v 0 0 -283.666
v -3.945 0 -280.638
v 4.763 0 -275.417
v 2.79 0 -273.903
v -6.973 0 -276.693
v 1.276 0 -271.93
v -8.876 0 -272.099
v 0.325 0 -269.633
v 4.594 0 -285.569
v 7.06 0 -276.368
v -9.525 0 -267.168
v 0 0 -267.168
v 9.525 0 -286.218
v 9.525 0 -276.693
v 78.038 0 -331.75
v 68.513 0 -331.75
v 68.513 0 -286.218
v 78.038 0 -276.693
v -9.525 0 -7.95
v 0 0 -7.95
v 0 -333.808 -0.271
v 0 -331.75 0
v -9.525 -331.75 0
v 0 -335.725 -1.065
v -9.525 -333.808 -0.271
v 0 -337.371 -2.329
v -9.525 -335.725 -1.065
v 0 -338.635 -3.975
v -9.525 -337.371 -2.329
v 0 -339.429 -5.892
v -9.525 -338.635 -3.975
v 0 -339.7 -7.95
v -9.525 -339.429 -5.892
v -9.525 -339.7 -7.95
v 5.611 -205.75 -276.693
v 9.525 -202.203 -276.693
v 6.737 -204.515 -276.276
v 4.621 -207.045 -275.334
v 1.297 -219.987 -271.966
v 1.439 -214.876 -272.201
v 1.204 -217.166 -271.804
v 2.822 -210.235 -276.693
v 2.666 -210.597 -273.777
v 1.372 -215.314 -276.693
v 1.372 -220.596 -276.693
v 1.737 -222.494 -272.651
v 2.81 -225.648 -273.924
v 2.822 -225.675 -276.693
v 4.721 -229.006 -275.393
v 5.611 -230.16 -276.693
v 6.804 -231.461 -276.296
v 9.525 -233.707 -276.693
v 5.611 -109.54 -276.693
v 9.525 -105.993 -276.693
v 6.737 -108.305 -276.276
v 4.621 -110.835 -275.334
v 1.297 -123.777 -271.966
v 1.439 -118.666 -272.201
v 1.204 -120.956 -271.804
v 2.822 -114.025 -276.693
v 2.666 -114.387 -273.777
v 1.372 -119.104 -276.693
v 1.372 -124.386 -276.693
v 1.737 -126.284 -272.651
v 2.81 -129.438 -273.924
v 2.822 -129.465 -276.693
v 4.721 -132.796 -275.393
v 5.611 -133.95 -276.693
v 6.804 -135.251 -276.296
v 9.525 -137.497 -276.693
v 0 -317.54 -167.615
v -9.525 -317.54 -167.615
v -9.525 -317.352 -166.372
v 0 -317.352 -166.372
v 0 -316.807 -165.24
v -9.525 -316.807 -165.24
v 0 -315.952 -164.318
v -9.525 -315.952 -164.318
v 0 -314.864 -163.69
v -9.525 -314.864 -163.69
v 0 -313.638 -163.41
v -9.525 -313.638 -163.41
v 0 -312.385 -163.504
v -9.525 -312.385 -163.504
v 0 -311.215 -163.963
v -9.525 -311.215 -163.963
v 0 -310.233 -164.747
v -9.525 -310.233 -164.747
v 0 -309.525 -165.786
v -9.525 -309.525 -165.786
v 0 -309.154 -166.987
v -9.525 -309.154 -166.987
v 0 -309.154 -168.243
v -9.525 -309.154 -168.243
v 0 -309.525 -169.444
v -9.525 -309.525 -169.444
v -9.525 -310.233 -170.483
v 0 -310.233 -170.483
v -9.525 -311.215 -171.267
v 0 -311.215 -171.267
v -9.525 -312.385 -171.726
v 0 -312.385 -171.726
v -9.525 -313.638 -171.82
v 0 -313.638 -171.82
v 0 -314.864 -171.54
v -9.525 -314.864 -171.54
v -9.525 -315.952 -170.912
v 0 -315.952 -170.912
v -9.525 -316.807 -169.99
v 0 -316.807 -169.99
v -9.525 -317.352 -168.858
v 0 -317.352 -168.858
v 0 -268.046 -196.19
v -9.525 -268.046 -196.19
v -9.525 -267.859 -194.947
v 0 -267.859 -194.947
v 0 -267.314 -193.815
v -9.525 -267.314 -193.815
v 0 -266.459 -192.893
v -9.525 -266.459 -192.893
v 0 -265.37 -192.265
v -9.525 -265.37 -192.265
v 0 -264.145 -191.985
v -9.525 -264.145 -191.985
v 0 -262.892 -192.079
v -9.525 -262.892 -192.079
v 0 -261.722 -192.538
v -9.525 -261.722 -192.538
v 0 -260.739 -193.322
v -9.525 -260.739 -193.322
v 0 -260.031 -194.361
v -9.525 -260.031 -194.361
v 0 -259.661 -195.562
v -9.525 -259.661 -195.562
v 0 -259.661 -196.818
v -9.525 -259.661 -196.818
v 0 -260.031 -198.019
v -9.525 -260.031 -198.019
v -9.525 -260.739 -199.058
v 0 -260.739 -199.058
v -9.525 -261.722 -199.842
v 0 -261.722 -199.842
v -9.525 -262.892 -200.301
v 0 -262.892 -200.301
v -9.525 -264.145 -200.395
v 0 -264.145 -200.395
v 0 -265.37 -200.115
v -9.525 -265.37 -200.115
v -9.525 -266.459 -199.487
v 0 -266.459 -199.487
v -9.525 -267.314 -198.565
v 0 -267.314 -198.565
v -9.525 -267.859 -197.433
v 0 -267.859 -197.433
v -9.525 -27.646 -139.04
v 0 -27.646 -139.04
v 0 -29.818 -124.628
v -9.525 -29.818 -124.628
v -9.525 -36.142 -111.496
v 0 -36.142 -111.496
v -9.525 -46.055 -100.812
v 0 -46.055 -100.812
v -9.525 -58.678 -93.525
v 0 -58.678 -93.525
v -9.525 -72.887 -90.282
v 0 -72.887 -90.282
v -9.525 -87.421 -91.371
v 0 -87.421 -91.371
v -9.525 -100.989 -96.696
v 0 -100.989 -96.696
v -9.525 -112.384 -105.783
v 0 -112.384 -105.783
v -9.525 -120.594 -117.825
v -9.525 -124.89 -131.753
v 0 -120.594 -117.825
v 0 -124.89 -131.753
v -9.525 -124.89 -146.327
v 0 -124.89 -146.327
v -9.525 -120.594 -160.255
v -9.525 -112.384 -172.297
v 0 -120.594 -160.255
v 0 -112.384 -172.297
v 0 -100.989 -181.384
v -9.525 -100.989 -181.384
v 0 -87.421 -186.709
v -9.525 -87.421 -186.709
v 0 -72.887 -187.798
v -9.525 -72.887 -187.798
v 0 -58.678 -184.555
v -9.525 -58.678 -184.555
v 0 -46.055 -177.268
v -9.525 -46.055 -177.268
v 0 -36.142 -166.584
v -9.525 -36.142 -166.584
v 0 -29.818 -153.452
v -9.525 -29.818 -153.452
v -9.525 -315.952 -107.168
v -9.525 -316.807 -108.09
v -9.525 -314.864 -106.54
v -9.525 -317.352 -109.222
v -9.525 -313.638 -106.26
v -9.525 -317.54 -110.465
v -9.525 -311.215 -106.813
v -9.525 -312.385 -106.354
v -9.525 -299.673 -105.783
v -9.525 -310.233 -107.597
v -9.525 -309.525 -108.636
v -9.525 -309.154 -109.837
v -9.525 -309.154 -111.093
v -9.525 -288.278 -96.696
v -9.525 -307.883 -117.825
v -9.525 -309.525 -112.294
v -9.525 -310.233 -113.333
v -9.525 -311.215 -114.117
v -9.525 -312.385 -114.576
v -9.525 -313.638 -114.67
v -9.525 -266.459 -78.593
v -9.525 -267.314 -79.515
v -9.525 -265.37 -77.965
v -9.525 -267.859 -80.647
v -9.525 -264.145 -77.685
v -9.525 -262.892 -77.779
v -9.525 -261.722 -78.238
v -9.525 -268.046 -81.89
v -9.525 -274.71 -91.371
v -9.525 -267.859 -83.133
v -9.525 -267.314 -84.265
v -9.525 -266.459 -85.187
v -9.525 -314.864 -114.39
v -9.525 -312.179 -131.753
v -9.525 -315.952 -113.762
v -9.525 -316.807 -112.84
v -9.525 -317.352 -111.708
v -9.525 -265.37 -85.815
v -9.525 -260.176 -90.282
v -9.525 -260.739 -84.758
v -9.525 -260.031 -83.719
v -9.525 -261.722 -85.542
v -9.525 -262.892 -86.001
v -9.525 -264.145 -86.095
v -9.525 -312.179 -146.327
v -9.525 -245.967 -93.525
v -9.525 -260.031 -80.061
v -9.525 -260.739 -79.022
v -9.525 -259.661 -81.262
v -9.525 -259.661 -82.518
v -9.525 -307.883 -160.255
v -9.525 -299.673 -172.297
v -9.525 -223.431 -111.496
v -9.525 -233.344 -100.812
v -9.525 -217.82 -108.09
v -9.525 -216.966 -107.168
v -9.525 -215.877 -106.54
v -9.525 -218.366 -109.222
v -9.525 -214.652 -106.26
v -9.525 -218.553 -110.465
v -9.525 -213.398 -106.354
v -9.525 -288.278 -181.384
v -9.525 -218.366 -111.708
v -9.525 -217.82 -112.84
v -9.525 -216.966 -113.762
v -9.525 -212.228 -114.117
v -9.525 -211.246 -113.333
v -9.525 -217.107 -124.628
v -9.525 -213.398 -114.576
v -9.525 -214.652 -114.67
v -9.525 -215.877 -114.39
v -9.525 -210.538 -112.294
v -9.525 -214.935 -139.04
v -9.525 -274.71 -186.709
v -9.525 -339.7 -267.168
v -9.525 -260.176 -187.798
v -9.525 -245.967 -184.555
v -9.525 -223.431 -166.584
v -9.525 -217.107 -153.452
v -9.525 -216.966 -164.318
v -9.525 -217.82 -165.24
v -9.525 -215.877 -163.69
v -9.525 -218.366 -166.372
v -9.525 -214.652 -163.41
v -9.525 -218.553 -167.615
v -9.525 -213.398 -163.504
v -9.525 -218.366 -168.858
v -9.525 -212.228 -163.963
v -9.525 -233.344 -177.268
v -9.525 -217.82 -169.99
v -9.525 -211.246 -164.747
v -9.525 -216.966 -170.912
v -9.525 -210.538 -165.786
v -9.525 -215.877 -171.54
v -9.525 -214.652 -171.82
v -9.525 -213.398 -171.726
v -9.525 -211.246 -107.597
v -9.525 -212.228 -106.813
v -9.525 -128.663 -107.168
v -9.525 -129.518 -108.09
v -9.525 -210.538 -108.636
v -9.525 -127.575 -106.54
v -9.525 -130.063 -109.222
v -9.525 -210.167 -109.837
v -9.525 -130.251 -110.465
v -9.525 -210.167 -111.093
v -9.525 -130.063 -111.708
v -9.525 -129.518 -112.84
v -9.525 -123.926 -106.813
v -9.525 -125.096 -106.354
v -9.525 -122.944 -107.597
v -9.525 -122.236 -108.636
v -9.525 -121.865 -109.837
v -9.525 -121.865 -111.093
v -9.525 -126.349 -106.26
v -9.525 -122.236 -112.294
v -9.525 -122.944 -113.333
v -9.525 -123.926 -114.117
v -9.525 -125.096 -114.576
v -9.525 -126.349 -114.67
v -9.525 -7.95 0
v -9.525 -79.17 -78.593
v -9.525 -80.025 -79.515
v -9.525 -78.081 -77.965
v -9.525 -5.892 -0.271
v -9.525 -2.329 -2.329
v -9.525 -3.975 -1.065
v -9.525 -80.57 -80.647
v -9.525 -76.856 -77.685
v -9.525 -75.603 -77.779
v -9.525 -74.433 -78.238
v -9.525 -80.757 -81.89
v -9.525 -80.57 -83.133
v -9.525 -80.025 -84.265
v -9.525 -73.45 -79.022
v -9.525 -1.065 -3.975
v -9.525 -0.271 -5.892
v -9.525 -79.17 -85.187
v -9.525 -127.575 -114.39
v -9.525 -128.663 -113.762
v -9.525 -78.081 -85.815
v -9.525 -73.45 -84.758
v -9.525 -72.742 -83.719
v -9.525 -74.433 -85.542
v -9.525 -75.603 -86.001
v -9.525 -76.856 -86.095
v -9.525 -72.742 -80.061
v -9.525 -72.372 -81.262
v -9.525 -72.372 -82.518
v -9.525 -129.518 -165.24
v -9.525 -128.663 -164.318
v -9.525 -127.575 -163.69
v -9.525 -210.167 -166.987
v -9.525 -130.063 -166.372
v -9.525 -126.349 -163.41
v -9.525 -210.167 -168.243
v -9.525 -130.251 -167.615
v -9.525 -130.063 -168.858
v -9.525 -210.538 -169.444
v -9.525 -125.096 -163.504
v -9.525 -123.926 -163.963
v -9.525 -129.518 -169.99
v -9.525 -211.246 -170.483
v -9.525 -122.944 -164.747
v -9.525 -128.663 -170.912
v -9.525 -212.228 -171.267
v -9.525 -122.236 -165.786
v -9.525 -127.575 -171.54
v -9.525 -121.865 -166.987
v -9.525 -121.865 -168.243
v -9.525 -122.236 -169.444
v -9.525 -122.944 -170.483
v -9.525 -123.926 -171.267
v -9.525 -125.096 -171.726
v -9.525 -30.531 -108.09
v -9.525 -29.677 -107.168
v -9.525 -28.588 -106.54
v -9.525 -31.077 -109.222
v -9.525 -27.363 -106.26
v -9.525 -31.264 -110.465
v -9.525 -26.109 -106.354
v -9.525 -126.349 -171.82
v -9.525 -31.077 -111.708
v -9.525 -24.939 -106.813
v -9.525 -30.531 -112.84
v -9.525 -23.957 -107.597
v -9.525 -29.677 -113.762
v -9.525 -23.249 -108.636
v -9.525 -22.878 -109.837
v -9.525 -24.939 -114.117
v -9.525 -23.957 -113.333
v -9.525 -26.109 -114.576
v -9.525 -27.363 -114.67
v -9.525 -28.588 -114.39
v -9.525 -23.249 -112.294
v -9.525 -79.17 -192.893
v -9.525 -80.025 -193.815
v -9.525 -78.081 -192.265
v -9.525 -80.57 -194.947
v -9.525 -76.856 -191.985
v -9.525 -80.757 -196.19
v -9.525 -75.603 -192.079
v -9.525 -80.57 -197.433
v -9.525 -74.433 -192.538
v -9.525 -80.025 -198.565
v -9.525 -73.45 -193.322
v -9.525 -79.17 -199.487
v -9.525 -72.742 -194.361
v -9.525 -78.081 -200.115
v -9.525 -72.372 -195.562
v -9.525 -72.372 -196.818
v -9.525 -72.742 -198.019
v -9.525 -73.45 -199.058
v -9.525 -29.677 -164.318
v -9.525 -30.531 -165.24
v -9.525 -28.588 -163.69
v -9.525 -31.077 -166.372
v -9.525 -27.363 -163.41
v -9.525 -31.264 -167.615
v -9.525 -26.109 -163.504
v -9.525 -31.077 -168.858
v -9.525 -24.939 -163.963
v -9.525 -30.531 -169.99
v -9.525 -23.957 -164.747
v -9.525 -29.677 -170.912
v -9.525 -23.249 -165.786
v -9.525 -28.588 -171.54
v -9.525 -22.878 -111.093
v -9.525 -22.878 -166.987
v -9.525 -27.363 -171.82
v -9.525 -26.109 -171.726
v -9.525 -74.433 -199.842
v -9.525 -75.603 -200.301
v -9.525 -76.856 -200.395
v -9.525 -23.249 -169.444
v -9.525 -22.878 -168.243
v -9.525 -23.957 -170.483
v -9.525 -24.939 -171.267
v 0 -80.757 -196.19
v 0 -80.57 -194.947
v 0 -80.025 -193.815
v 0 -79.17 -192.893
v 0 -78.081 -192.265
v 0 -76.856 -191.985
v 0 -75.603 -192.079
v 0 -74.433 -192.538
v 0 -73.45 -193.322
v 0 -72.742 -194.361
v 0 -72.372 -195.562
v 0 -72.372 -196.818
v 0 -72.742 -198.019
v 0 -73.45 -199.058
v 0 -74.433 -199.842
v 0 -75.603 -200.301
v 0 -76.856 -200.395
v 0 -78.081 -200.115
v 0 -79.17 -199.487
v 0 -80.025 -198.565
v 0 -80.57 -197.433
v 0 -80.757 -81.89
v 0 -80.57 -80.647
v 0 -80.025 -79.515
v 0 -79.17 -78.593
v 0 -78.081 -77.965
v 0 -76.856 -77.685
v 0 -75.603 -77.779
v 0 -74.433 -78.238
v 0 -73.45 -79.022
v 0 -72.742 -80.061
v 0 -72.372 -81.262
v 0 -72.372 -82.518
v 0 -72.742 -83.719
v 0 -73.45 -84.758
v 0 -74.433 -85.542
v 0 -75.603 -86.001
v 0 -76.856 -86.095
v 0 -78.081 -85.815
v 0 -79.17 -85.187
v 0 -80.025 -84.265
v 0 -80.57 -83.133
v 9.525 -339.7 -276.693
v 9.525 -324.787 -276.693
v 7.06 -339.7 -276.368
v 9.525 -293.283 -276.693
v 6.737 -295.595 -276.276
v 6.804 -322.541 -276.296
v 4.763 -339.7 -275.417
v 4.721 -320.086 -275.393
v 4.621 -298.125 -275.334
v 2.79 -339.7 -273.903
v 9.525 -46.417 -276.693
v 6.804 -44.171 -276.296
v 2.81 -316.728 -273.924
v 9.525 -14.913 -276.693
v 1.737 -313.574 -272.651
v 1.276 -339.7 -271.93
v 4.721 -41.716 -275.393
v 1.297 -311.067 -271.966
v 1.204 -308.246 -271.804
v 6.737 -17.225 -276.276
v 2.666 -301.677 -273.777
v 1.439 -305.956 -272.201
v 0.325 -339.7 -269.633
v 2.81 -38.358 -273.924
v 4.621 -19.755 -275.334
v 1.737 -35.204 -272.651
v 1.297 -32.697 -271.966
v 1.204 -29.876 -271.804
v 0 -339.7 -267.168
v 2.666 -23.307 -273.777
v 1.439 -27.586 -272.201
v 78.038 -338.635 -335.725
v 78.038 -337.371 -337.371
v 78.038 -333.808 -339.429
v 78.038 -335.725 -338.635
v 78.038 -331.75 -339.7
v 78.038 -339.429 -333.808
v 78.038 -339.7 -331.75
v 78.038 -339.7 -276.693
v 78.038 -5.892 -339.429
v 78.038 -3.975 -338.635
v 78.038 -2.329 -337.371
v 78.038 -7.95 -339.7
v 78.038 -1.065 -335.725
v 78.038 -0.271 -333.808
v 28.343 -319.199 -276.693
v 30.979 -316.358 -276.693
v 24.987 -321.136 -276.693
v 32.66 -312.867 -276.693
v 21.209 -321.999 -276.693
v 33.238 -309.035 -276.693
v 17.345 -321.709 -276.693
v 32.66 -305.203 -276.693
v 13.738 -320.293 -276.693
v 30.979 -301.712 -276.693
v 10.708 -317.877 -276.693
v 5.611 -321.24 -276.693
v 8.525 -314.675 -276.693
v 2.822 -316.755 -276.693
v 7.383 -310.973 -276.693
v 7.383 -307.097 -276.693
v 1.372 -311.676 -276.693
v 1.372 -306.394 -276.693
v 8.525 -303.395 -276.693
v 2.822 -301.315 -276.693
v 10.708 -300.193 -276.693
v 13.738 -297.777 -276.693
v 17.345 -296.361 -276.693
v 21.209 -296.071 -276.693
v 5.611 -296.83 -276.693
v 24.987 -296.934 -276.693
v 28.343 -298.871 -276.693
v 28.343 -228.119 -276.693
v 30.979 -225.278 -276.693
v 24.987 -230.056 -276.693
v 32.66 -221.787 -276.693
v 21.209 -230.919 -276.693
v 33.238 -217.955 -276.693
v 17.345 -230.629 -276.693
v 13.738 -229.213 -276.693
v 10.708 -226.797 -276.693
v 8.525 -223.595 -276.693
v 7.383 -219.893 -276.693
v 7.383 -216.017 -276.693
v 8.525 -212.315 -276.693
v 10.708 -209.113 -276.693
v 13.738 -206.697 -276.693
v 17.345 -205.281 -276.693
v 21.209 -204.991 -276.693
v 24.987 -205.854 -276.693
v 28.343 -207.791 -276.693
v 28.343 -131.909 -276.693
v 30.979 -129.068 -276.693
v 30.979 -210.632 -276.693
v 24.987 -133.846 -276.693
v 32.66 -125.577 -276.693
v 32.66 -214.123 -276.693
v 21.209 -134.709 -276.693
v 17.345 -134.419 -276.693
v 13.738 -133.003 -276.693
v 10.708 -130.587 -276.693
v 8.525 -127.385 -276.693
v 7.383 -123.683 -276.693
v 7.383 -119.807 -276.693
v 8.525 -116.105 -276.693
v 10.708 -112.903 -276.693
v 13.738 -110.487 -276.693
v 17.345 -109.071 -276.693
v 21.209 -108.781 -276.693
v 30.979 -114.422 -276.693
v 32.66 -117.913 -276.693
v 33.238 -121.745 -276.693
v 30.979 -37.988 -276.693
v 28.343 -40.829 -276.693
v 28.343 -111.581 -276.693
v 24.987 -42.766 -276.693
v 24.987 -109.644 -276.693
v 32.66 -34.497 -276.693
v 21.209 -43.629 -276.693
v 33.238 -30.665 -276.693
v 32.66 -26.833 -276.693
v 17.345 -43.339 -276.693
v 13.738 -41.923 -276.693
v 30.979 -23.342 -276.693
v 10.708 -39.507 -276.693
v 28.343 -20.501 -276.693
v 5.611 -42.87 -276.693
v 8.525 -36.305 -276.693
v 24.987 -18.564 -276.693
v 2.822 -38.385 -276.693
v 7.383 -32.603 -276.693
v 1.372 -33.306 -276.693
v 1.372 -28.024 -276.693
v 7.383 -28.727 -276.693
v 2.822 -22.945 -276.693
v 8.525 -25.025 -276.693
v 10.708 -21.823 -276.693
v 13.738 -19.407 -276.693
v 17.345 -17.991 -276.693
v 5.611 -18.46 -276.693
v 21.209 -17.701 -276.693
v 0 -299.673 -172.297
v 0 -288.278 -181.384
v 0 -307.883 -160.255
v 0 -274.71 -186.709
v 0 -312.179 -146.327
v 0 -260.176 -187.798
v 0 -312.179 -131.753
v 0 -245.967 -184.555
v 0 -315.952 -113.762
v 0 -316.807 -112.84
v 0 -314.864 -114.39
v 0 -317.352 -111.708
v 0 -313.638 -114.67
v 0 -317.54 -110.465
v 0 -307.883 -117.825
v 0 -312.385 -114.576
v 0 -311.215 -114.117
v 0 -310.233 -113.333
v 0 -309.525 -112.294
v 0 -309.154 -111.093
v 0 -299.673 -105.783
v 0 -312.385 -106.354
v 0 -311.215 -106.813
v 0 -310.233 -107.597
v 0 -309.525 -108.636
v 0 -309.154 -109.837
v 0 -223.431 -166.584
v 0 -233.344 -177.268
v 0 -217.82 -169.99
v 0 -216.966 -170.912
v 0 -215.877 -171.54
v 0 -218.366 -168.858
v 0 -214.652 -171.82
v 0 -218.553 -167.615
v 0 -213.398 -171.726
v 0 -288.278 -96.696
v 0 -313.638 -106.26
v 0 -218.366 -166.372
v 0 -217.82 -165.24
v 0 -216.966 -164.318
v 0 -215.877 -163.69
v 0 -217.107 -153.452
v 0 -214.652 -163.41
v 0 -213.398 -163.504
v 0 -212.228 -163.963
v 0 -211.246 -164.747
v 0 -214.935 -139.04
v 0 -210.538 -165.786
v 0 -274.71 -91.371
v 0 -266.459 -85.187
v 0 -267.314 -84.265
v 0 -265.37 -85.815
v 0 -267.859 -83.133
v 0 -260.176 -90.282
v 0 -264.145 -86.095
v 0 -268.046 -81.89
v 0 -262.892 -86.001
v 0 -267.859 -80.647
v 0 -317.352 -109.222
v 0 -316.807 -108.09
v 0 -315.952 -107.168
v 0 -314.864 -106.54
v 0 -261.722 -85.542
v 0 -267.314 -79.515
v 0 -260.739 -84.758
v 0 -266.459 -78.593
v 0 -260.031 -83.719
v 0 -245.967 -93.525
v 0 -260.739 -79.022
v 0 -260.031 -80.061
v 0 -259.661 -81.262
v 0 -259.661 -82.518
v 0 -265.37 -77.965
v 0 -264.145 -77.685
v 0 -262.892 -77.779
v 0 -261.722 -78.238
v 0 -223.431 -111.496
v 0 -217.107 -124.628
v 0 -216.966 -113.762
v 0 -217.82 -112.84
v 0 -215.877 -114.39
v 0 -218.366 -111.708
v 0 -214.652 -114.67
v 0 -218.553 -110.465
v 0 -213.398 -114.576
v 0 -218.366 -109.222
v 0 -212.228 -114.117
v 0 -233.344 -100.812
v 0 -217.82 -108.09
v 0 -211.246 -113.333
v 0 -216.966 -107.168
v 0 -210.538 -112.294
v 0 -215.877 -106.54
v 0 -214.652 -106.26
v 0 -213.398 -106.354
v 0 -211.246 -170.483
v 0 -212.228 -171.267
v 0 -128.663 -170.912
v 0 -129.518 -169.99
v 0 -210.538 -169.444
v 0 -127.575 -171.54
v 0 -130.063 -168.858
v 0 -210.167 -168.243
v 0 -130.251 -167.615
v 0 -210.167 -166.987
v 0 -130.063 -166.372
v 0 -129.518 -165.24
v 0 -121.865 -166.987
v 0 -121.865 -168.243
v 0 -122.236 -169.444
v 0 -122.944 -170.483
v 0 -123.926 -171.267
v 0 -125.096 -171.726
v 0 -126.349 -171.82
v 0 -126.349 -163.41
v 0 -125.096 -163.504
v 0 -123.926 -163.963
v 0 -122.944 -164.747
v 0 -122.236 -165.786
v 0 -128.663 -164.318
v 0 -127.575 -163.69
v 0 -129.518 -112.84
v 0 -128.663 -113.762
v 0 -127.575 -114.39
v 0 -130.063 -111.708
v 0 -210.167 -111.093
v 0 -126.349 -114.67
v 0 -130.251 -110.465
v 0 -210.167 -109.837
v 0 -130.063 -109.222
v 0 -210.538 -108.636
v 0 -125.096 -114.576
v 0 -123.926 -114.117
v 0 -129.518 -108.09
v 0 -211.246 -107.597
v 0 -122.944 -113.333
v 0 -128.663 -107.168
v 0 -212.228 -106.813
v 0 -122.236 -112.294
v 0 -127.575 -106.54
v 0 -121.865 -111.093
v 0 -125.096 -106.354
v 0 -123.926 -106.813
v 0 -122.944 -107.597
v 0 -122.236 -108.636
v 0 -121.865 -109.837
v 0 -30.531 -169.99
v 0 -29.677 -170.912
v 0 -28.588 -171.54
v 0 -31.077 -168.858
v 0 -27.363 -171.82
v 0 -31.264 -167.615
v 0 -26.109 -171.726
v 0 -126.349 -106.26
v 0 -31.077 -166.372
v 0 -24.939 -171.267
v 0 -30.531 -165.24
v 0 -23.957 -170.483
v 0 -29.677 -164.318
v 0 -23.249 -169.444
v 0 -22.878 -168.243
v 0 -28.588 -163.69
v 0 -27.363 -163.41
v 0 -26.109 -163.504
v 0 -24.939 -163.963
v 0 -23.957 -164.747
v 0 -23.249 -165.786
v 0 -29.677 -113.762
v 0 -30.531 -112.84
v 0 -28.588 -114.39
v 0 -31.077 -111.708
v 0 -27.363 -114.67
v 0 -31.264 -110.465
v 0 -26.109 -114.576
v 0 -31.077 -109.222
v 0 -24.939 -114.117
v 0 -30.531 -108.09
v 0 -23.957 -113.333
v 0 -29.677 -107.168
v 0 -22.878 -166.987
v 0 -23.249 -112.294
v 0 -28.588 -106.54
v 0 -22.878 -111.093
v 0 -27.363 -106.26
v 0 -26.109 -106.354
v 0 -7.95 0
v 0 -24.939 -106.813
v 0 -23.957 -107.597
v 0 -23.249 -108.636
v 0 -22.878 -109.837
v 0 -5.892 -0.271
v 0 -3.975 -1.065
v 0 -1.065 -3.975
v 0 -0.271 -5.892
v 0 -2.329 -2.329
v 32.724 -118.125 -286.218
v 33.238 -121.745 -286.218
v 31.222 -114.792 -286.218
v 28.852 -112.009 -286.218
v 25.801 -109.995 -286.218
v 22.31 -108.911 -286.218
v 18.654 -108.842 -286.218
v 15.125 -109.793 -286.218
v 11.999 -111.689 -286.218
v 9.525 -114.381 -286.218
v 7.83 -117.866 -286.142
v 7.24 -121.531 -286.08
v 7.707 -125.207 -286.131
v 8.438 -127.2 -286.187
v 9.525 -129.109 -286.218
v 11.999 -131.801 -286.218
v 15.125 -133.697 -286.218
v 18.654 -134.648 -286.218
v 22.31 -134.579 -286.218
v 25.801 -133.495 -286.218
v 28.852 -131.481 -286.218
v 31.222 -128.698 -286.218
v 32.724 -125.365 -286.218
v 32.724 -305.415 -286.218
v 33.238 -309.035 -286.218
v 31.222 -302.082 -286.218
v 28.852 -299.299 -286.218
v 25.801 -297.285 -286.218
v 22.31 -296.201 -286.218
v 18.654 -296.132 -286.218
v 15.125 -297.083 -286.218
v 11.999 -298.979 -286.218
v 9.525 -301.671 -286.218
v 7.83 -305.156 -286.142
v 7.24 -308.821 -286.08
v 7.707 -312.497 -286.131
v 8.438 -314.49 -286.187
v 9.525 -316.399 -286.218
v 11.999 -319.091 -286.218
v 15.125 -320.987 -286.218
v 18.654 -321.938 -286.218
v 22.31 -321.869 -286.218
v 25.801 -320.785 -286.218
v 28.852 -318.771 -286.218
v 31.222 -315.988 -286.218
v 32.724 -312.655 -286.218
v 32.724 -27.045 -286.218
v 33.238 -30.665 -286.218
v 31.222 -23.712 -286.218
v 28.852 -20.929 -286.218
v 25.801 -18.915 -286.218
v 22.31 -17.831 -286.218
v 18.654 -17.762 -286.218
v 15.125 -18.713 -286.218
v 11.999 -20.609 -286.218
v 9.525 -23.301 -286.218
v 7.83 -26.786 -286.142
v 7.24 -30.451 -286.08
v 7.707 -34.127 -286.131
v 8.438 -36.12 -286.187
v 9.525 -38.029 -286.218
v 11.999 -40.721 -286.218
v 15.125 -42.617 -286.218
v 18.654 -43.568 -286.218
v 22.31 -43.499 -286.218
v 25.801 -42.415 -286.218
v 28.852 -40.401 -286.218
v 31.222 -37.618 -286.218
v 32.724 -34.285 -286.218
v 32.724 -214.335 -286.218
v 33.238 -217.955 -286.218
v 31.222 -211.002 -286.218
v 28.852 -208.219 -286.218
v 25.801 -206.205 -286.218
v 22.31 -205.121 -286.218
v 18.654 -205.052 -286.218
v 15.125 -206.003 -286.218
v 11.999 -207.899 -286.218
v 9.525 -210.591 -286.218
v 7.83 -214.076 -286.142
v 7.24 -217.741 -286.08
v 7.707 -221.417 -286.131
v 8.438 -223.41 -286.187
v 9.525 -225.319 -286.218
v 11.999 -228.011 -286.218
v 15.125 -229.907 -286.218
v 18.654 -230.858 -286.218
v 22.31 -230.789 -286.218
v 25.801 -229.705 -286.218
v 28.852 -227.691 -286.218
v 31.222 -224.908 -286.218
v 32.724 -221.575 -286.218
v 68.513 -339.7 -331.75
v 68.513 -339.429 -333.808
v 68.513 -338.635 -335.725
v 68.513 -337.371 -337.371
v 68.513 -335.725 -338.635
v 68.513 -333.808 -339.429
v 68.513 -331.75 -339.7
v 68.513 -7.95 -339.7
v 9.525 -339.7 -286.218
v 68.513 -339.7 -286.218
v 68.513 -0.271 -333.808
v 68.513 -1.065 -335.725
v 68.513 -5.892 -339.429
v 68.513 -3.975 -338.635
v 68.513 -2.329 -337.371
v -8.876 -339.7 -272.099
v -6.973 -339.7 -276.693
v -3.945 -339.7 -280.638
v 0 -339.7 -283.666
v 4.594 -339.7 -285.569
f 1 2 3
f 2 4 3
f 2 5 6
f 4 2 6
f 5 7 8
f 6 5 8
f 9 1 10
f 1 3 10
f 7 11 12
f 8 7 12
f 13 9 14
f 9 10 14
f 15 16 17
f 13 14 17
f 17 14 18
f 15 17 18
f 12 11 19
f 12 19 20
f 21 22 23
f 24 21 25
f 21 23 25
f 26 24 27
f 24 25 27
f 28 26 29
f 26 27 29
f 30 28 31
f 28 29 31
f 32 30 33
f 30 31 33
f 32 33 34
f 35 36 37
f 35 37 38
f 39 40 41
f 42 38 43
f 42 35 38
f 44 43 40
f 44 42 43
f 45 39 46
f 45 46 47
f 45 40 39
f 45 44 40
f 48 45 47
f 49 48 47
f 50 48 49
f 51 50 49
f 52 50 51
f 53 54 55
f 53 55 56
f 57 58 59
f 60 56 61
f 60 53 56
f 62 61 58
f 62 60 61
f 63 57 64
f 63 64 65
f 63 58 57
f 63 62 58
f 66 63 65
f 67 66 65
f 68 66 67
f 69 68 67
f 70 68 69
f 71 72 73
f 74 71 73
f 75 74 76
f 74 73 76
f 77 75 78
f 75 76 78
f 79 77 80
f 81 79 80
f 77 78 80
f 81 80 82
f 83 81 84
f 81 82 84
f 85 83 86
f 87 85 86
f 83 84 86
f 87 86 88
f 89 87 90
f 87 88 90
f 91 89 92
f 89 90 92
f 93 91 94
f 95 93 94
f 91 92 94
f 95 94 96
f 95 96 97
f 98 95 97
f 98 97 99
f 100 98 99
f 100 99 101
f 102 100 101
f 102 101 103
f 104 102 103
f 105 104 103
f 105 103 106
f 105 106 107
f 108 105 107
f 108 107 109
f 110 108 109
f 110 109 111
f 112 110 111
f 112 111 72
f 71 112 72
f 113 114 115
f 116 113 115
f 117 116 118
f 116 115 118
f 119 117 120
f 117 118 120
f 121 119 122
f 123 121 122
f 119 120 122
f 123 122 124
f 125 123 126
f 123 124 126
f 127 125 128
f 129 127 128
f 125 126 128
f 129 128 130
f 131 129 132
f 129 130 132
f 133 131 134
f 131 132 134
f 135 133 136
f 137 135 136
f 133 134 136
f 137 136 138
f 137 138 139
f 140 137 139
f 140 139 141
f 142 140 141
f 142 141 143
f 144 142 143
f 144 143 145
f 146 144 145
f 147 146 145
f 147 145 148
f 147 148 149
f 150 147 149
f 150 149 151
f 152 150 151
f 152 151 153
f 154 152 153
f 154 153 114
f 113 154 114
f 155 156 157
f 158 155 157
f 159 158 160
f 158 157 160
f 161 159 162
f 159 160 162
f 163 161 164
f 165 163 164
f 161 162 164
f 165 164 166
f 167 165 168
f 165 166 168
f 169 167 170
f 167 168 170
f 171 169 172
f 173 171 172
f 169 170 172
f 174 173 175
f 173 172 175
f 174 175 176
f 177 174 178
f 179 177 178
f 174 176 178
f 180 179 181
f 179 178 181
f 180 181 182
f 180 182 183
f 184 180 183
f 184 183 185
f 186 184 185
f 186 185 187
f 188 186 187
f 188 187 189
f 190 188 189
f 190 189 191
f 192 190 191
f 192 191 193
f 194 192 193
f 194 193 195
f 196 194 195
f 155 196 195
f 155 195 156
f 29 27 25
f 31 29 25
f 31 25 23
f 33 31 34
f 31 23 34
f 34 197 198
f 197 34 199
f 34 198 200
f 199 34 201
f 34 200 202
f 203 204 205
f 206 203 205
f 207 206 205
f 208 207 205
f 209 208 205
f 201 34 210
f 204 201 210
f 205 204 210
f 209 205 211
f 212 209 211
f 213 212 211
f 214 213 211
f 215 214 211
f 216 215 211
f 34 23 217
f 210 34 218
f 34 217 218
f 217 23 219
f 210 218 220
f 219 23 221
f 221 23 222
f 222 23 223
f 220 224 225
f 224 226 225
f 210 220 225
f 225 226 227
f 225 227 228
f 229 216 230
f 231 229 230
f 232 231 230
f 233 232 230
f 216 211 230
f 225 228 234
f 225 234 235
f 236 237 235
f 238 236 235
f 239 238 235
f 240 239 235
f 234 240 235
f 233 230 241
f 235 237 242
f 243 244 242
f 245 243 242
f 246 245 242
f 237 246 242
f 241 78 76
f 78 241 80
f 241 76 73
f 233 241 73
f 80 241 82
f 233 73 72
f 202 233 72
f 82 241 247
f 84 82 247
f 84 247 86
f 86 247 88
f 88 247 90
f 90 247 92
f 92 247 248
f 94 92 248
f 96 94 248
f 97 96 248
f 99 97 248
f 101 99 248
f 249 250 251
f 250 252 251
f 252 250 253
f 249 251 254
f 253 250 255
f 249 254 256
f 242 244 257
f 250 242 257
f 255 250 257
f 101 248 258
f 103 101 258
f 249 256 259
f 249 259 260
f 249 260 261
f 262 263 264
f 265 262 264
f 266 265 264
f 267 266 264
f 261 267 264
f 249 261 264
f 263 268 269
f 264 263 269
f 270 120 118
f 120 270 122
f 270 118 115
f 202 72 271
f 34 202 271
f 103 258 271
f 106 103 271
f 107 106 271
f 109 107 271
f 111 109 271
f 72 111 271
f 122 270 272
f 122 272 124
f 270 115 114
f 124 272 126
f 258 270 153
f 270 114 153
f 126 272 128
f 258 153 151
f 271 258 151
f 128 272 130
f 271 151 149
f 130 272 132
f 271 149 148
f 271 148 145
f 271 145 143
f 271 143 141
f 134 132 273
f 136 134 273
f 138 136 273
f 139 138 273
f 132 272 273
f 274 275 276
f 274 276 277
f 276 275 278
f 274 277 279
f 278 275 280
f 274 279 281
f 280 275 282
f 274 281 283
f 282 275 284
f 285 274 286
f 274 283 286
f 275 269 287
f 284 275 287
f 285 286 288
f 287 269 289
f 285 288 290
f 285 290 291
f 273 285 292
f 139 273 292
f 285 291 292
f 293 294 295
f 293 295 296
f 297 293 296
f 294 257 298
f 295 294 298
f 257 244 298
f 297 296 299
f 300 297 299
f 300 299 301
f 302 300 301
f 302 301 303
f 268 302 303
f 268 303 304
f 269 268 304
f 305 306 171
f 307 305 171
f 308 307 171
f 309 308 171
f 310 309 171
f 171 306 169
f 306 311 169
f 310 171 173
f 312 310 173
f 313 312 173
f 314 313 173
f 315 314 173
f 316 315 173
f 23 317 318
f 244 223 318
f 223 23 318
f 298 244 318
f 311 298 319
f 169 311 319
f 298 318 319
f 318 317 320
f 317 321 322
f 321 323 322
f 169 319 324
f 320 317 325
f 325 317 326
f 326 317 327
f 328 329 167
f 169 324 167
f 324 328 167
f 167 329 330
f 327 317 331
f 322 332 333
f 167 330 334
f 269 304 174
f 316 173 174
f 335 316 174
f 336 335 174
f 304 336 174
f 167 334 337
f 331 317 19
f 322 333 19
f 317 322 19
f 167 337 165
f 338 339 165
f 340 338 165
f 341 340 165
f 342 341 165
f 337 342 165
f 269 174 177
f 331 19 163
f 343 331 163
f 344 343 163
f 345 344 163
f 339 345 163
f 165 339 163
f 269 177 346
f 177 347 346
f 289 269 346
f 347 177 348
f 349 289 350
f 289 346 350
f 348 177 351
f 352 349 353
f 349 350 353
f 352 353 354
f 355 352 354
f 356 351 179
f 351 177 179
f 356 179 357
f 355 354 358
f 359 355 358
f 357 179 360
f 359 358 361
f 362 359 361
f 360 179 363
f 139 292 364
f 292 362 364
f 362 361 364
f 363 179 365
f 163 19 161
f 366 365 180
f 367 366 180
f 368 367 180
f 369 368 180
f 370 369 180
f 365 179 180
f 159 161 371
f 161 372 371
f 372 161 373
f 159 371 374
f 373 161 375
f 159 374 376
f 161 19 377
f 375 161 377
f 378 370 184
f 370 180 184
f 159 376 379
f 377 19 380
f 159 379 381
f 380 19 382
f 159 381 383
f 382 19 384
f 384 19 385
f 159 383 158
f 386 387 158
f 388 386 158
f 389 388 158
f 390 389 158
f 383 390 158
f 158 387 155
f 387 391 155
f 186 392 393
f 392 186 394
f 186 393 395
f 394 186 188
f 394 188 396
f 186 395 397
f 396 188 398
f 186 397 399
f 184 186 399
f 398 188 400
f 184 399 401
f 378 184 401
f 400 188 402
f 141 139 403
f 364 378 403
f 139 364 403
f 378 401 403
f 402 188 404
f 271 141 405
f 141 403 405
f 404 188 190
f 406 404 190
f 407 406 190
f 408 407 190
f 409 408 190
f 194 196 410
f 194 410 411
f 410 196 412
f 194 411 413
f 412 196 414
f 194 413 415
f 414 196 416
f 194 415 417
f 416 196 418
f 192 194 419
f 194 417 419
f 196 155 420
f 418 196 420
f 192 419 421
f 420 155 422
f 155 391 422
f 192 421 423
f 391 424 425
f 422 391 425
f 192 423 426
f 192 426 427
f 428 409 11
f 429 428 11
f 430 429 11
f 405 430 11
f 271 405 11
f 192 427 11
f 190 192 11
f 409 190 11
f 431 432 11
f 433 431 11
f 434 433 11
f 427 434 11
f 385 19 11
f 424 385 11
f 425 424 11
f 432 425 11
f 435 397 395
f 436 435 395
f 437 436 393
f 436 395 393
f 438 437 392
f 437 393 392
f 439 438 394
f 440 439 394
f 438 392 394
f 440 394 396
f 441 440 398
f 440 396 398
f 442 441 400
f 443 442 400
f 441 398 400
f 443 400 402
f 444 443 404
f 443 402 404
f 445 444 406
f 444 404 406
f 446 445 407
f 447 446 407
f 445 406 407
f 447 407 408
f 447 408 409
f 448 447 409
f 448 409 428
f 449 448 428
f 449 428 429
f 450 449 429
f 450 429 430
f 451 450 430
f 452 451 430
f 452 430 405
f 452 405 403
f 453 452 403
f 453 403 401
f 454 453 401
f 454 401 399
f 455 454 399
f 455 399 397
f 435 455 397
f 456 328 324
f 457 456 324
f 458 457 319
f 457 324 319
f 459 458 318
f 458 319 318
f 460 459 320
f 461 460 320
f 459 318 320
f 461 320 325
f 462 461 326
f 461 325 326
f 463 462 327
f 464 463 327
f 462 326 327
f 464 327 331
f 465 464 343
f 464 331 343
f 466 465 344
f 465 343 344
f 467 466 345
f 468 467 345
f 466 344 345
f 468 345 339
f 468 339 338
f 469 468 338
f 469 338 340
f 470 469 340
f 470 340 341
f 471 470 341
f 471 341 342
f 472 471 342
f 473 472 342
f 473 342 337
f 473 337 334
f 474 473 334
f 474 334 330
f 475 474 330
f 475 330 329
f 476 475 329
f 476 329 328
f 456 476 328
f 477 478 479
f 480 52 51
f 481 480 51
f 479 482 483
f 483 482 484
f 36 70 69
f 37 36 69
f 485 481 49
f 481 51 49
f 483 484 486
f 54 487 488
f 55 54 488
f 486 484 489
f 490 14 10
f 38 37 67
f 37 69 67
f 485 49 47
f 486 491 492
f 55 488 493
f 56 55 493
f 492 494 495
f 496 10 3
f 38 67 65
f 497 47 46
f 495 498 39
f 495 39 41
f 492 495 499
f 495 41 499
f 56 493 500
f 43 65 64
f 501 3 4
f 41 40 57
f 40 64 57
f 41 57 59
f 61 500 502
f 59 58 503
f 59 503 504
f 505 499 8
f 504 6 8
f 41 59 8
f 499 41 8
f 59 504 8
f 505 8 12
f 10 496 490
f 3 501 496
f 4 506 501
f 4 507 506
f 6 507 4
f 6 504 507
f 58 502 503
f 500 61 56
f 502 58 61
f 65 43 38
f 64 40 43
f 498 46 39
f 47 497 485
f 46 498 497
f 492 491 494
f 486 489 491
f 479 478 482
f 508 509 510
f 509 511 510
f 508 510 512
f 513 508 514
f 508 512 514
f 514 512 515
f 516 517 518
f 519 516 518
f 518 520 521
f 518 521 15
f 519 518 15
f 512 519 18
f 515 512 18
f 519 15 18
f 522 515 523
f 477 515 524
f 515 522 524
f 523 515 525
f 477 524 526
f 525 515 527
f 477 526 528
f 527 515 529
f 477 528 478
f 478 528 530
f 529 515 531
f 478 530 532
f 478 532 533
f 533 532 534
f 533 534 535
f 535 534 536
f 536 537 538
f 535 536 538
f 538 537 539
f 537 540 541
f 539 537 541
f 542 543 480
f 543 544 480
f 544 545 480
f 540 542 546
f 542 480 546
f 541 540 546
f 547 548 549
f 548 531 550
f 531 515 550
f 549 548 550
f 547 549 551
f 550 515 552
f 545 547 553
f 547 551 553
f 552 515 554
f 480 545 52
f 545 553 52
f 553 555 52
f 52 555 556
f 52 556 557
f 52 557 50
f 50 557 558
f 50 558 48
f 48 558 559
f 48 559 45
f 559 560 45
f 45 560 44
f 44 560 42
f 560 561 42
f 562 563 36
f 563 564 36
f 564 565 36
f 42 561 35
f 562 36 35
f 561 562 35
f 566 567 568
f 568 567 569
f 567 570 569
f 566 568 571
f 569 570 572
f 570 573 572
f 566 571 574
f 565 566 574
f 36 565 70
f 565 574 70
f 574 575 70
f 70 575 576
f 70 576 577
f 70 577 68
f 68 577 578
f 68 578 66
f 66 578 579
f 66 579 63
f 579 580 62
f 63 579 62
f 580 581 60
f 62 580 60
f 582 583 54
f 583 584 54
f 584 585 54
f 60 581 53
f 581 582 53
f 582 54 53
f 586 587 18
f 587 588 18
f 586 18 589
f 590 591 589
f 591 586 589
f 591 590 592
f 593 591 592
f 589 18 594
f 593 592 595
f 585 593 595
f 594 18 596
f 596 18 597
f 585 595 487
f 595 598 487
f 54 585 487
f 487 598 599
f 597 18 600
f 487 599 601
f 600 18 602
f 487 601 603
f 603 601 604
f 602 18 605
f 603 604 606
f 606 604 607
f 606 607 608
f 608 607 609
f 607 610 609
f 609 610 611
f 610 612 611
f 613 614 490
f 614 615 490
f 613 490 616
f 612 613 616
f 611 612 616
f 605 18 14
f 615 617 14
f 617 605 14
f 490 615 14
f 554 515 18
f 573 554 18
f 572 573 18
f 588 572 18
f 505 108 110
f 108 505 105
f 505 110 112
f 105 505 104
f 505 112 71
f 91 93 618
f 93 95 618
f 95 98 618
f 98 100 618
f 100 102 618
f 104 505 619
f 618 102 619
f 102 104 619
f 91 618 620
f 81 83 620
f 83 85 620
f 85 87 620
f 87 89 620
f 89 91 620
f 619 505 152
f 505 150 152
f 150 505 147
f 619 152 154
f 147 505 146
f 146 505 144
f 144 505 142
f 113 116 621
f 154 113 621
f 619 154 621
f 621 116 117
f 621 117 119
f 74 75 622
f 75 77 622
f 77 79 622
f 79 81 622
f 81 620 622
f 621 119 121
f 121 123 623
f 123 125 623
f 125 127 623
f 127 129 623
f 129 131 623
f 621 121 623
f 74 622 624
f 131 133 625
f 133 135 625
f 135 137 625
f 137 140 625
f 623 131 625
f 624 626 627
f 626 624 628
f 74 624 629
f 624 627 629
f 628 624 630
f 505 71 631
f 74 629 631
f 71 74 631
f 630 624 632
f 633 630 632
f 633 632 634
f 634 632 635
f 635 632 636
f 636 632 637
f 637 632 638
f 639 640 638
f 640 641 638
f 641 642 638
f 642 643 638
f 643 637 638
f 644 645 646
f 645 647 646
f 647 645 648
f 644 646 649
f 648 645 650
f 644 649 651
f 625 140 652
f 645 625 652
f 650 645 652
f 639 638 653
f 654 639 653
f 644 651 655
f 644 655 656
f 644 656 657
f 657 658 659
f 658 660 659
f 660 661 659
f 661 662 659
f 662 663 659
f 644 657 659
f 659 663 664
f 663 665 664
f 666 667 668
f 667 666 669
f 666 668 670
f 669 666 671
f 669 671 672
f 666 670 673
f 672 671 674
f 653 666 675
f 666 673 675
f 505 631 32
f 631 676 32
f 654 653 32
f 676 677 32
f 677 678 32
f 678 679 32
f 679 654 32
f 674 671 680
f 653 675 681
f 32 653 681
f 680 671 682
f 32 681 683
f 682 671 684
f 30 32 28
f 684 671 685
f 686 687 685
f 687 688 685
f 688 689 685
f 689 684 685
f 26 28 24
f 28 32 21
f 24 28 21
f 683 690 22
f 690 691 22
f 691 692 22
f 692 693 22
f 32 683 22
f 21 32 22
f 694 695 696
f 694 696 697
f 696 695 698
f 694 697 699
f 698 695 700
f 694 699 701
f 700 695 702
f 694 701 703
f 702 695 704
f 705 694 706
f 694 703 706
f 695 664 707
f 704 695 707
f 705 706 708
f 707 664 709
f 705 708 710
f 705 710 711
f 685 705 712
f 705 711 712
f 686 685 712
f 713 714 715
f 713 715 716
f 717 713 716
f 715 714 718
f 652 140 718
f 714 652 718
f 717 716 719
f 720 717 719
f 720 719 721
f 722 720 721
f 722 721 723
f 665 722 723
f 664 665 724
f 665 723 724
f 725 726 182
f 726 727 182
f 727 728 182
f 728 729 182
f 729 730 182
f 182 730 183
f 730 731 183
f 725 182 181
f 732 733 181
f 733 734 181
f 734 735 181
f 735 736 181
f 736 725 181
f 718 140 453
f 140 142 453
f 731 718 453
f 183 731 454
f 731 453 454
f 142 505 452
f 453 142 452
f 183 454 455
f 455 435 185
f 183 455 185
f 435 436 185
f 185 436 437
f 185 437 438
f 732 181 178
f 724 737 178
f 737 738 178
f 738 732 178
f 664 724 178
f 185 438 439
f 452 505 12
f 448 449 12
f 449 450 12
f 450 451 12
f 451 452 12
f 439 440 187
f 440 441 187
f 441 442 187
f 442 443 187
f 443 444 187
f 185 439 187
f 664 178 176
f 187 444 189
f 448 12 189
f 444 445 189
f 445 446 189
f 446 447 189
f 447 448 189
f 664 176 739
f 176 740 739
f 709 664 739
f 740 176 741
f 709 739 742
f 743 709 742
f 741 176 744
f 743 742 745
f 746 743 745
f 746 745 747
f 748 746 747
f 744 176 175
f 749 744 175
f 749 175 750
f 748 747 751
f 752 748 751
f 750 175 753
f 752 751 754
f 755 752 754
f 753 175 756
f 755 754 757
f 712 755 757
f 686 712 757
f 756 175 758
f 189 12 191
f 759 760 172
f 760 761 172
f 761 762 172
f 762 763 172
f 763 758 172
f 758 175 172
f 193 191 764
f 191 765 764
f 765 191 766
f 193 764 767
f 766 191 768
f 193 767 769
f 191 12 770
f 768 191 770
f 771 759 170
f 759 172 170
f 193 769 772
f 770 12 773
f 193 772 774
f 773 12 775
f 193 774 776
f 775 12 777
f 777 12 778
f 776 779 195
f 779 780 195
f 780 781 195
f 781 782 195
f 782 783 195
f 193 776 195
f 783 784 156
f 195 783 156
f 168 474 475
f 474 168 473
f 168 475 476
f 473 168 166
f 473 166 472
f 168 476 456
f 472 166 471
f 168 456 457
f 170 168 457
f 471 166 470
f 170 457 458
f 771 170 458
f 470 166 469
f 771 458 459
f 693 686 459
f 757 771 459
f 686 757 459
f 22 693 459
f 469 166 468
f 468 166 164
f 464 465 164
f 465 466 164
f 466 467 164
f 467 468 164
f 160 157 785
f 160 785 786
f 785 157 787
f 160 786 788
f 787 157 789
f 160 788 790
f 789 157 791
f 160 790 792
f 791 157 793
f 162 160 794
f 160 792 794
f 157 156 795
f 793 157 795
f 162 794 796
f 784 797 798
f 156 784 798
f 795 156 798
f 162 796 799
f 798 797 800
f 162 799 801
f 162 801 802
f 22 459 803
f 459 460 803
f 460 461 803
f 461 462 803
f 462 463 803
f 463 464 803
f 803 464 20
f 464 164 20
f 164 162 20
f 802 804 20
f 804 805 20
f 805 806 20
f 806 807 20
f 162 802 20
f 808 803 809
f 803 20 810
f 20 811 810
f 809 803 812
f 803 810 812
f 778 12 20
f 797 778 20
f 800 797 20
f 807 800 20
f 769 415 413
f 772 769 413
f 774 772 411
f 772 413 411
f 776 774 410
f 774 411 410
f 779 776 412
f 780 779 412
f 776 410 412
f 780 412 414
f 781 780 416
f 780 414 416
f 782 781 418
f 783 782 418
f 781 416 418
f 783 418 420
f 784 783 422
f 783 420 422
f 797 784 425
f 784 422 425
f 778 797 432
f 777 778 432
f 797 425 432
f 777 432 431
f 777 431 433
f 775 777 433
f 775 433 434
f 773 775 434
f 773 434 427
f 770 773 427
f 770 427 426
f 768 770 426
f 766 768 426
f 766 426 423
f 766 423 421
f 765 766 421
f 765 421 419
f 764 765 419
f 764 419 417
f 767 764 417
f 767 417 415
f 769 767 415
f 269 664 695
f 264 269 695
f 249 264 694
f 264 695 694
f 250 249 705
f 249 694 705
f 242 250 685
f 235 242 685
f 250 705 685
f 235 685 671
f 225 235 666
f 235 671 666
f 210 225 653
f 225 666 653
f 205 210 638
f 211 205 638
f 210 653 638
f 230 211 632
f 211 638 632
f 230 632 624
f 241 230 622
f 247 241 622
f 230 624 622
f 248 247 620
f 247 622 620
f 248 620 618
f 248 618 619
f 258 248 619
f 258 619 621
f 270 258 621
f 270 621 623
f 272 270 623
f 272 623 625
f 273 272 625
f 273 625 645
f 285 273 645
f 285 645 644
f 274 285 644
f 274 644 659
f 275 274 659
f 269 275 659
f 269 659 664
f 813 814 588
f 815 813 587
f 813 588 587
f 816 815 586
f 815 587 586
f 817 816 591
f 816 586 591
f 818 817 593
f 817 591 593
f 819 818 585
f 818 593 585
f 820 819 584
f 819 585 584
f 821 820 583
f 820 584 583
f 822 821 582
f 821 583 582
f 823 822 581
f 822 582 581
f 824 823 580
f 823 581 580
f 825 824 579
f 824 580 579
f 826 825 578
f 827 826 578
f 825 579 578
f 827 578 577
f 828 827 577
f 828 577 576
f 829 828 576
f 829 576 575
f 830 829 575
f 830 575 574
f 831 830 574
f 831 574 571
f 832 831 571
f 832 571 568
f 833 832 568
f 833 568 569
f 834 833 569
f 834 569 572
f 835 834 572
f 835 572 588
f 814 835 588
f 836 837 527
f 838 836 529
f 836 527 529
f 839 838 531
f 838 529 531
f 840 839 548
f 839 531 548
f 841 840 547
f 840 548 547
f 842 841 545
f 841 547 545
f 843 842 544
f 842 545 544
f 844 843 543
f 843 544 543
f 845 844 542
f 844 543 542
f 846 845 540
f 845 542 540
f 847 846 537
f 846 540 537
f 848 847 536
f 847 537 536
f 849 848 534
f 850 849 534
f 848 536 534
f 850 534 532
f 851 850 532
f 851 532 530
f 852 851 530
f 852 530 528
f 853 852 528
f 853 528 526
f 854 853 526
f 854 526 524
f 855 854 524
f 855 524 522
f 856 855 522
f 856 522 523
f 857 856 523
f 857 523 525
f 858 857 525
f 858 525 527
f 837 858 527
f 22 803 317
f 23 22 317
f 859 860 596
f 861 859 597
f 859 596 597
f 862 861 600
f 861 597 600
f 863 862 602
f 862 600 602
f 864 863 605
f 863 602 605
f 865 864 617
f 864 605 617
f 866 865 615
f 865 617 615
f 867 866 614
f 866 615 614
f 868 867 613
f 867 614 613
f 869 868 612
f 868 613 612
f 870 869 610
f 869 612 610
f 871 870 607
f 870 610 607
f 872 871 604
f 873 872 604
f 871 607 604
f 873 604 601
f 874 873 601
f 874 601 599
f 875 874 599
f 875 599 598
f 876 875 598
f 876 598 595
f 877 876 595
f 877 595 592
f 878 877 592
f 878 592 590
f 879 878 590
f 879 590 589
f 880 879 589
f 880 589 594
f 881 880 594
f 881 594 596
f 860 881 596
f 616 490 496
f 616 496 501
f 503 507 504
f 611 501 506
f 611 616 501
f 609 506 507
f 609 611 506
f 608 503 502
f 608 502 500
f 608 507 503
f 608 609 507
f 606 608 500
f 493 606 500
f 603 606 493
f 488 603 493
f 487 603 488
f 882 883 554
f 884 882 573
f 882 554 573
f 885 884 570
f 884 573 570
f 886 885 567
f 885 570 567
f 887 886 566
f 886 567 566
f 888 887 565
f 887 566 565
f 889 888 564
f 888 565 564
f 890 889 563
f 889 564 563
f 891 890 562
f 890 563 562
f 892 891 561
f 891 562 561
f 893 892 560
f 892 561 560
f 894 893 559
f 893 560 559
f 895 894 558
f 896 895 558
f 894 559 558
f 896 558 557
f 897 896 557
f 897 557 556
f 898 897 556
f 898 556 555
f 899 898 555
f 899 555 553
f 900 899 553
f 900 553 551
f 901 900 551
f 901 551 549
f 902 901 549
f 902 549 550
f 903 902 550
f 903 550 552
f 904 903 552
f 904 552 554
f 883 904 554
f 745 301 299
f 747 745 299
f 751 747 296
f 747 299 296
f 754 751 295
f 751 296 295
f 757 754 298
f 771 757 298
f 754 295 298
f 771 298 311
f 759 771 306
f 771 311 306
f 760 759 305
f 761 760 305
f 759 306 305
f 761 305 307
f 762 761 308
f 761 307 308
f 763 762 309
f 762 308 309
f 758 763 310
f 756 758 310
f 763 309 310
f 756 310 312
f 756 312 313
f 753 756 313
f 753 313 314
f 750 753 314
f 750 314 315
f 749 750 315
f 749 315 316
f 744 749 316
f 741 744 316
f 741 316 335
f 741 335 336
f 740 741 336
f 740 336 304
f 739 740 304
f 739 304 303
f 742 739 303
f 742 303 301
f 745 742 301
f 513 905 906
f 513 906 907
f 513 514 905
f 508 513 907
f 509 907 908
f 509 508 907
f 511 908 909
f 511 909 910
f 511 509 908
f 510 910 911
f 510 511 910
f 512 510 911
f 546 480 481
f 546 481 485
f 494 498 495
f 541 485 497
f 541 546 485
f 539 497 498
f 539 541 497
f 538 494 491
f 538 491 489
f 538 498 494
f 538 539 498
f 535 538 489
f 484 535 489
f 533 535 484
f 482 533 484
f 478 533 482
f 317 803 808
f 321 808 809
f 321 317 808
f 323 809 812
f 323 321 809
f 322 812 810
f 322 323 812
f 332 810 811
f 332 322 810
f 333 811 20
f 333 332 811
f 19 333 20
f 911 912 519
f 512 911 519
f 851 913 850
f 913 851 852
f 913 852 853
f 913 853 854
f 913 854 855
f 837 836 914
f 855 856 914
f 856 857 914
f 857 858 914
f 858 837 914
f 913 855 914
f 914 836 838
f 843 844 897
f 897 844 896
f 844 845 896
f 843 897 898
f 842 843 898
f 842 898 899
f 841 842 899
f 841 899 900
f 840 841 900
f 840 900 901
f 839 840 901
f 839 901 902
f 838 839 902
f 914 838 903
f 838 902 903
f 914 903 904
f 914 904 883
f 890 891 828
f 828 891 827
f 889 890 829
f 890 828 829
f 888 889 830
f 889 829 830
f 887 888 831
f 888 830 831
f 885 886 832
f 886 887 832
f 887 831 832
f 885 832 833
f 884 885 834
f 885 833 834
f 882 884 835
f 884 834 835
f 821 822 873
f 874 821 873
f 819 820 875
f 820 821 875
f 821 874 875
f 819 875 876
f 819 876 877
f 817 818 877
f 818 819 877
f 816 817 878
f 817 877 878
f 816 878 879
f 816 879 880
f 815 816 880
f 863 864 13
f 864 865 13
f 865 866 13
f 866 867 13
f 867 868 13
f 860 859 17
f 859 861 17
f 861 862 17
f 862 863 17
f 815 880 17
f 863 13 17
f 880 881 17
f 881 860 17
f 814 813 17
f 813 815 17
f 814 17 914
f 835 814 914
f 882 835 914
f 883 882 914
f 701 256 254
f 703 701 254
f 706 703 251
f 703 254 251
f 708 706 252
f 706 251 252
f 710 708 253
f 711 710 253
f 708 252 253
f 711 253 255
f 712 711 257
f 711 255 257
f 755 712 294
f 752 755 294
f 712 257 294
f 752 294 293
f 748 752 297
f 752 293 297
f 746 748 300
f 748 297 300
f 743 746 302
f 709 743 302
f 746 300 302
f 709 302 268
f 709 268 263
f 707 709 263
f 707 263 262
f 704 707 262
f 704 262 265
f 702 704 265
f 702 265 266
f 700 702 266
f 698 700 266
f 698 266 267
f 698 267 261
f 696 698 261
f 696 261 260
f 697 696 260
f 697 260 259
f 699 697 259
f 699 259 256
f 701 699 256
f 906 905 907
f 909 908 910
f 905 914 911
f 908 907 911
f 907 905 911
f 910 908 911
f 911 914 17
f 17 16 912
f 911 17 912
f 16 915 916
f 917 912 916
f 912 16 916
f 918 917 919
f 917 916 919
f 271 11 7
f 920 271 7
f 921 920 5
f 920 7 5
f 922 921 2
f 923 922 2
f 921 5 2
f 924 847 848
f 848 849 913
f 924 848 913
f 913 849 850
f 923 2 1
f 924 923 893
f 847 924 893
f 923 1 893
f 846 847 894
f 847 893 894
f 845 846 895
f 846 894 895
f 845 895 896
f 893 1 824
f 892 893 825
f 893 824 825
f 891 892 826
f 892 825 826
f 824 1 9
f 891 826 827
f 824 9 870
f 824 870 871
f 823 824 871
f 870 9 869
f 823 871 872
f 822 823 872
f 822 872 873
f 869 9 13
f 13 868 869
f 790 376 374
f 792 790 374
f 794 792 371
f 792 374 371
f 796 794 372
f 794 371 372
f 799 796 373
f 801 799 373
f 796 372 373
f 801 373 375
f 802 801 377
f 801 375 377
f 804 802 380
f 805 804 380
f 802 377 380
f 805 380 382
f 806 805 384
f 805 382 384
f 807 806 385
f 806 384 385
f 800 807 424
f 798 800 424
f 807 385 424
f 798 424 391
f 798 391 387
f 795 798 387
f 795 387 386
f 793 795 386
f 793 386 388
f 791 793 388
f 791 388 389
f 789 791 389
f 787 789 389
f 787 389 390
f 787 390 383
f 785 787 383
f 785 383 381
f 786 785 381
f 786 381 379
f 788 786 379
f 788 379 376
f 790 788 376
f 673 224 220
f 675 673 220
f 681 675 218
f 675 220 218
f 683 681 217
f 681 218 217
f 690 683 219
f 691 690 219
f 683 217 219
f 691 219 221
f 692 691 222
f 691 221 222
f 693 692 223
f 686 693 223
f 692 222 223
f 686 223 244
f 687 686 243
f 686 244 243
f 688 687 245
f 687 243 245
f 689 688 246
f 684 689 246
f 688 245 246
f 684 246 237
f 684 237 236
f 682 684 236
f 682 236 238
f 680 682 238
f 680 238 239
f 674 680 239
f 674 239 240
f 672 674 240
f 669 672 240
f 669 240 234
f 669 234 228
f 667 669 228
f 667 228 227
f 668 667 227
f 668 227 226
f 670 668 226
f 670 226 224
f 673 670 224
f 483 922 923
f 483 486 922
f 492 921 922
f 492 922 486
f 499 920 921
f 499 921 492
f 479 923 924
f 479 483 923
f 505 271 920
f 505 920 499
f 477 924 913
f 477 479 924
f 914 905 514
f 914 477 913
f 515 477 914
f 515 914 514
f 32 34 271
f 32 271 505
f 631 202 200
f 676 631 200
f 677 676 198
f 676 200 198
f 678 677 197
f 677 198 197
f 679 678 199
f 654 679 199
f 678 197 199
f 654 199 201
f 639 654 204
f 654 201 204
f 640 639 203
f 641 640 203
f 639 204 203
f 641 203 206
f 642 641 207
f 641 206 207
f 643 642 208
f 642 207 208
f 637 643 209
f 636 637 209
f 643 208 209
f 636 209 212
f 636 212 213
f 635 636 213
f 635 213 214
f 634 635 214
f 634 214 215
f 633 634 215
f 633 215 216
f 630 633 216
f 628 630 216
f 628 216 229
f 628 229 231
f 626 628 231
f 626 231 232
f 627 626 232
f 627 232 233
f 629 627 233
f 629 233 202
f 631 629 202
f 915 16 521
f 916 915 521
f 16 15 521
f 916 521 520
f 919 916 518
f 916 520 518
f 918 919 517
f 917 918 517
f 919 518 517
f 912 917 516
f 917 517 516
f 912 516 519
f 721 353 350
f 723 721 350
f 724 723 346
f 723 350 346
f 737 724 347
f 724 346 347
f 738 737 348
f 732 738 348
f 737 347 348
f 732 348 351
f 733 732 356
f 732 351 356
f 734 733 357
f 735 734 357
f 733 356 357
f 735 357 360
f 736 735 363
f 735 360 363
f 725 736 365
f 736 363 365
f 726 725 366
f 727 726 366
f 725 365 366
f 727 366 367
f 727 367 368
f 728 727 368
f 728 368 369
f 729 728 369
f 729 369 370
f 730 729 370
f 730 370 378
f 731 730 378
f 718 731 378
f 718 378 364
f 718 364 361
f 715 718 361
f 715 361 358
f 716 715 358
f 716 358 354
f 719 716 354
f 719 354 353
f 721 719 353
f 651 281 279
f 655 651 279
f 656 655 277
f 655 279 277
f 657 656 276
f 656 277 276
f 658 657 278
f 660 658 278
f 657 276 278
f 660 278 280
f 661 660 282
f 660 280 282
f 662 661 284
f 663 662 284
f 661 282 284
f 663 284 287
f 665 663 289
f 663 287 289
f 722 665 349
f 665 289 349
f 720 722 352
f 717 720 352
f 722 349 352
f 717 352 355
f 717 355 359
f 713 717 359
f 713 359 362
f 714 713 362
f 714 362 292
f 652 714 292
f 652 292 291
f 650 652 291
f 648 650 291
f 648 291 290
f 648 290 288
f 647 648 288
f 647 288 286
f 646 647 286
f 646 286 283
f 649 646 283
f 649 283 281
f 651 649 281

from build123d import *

# Parameters (mm, degrees)
F1_DEPTH  = 339.7
F2_R      = 7.95
F3_R      = 7.95
F4_R      = 48.895
F5_DEPTH  = 9.526
F6_D      = 8.4328
F8_D      = 26
F8_DEPTH  = 63.008
F9_R      = 19.05
F10_DEPTH = 25


with BuildPart() as f1:
    # F0 (on Front) → F1 (new body)
    with BuildSketch(Plane.XZ):
        with BuildLine():
            Line((0, -267.168), (0, 0))
            Line((0, 0), (-9.525, 0))
            Line((-9.525, 0), (-9.525, -267.168))
            ThreePointArc((-9.525, -267.168), (-3.9453841816, -280.6383841816), (9.525, -286.218))
            Line((9.525, -286.218), (68.513, -286.218))
            Line((68.513, -286.218), (68.513, -339.7))
            Line((68.513, -339.7), (78.038, -339.7))
            Line((78.038, -339.7), (78.038, -276.693))
            Line((78.038, -276.693), (9.525, -276.693))
            ThreePointArc((9.525, -276.693), (2.7898079092, -273.9031920908), (0, -267.168))
        make_face()
    extrude(amount=F1_DEPTH)

    # F2
    f2_edges = [f1.edges().sort_by_distance(p)[0] for p in [
        (-4.7625, -339.7, 0),
    ]]
    fillet(f2_edges, radius=F2_R)

    # F3
    f3_edges = [f1.edges().sort_by_distance(p)[0] for p in [
        (-4.7625, 0, 0),
        (73.2755, 0, -339.7),
        (73.2755, -339.7, -339.7),
    ]]
    fillet(f3_edges, radius=F3_R)

    # F4 (on face) → F5 (cut, through all)
    with BuildSketch(Plane.YZ):
        with Locations((-76.541, -139.04)):
            Circle(F4_R)
        with Locations((-263.83, -139.04)):
            Circle(F4_R)
    extrude(amount=-F5_DEPTH, mode=Mode.SUBTRACT)

    # F6 (through all)
    with Locations(Plane.YZ):
        with Locations((-263.83, -81.89), (-313.3233518263, -110.465), (-313.3233518263, -167.615), (-263.83, -196.19), (-214.3366481737, -167.615), (-214.3366481737, -110.465), (-126.0343518263, -110.465), (-76.541, -81.89), (-27.0476481737, -110.465), (-27.0476481737, -167.615), (-76.541, -196.19), (-126.0343518263, -167.615)):
            Hole(F6_D / 2)

    # F8 (through all, one way)
    with BuildSketch(Plane.XY.offset(-276.693)):
        with Locations((20.238, -30.665), (20.238, -121.745), (20.238, -217.955), (20.238, -309.035)):
            Circle(F8_D / 2)
    extrude(amount=-F8_DEPTH, mode=Mode.SUBTRACT)

    # F9 (on face) → F10 (cut)
    with BuildSketch(Plane.XY.offset(-276.693)):
        with Locations((20.238, -30.665)):
            Circle(F9_R)
        with Locations((20.238, -121.745)):
            Circle(F9_R)
        with Locations((20.238, -217.955)):
            Circle(F9_R)
        with Locations((20.238, -309.035)):
            Circle(F9_R)
    extrude(amount=F10_DEPTH, mode=Mode.SUBTRACT)


solid = f1.part
